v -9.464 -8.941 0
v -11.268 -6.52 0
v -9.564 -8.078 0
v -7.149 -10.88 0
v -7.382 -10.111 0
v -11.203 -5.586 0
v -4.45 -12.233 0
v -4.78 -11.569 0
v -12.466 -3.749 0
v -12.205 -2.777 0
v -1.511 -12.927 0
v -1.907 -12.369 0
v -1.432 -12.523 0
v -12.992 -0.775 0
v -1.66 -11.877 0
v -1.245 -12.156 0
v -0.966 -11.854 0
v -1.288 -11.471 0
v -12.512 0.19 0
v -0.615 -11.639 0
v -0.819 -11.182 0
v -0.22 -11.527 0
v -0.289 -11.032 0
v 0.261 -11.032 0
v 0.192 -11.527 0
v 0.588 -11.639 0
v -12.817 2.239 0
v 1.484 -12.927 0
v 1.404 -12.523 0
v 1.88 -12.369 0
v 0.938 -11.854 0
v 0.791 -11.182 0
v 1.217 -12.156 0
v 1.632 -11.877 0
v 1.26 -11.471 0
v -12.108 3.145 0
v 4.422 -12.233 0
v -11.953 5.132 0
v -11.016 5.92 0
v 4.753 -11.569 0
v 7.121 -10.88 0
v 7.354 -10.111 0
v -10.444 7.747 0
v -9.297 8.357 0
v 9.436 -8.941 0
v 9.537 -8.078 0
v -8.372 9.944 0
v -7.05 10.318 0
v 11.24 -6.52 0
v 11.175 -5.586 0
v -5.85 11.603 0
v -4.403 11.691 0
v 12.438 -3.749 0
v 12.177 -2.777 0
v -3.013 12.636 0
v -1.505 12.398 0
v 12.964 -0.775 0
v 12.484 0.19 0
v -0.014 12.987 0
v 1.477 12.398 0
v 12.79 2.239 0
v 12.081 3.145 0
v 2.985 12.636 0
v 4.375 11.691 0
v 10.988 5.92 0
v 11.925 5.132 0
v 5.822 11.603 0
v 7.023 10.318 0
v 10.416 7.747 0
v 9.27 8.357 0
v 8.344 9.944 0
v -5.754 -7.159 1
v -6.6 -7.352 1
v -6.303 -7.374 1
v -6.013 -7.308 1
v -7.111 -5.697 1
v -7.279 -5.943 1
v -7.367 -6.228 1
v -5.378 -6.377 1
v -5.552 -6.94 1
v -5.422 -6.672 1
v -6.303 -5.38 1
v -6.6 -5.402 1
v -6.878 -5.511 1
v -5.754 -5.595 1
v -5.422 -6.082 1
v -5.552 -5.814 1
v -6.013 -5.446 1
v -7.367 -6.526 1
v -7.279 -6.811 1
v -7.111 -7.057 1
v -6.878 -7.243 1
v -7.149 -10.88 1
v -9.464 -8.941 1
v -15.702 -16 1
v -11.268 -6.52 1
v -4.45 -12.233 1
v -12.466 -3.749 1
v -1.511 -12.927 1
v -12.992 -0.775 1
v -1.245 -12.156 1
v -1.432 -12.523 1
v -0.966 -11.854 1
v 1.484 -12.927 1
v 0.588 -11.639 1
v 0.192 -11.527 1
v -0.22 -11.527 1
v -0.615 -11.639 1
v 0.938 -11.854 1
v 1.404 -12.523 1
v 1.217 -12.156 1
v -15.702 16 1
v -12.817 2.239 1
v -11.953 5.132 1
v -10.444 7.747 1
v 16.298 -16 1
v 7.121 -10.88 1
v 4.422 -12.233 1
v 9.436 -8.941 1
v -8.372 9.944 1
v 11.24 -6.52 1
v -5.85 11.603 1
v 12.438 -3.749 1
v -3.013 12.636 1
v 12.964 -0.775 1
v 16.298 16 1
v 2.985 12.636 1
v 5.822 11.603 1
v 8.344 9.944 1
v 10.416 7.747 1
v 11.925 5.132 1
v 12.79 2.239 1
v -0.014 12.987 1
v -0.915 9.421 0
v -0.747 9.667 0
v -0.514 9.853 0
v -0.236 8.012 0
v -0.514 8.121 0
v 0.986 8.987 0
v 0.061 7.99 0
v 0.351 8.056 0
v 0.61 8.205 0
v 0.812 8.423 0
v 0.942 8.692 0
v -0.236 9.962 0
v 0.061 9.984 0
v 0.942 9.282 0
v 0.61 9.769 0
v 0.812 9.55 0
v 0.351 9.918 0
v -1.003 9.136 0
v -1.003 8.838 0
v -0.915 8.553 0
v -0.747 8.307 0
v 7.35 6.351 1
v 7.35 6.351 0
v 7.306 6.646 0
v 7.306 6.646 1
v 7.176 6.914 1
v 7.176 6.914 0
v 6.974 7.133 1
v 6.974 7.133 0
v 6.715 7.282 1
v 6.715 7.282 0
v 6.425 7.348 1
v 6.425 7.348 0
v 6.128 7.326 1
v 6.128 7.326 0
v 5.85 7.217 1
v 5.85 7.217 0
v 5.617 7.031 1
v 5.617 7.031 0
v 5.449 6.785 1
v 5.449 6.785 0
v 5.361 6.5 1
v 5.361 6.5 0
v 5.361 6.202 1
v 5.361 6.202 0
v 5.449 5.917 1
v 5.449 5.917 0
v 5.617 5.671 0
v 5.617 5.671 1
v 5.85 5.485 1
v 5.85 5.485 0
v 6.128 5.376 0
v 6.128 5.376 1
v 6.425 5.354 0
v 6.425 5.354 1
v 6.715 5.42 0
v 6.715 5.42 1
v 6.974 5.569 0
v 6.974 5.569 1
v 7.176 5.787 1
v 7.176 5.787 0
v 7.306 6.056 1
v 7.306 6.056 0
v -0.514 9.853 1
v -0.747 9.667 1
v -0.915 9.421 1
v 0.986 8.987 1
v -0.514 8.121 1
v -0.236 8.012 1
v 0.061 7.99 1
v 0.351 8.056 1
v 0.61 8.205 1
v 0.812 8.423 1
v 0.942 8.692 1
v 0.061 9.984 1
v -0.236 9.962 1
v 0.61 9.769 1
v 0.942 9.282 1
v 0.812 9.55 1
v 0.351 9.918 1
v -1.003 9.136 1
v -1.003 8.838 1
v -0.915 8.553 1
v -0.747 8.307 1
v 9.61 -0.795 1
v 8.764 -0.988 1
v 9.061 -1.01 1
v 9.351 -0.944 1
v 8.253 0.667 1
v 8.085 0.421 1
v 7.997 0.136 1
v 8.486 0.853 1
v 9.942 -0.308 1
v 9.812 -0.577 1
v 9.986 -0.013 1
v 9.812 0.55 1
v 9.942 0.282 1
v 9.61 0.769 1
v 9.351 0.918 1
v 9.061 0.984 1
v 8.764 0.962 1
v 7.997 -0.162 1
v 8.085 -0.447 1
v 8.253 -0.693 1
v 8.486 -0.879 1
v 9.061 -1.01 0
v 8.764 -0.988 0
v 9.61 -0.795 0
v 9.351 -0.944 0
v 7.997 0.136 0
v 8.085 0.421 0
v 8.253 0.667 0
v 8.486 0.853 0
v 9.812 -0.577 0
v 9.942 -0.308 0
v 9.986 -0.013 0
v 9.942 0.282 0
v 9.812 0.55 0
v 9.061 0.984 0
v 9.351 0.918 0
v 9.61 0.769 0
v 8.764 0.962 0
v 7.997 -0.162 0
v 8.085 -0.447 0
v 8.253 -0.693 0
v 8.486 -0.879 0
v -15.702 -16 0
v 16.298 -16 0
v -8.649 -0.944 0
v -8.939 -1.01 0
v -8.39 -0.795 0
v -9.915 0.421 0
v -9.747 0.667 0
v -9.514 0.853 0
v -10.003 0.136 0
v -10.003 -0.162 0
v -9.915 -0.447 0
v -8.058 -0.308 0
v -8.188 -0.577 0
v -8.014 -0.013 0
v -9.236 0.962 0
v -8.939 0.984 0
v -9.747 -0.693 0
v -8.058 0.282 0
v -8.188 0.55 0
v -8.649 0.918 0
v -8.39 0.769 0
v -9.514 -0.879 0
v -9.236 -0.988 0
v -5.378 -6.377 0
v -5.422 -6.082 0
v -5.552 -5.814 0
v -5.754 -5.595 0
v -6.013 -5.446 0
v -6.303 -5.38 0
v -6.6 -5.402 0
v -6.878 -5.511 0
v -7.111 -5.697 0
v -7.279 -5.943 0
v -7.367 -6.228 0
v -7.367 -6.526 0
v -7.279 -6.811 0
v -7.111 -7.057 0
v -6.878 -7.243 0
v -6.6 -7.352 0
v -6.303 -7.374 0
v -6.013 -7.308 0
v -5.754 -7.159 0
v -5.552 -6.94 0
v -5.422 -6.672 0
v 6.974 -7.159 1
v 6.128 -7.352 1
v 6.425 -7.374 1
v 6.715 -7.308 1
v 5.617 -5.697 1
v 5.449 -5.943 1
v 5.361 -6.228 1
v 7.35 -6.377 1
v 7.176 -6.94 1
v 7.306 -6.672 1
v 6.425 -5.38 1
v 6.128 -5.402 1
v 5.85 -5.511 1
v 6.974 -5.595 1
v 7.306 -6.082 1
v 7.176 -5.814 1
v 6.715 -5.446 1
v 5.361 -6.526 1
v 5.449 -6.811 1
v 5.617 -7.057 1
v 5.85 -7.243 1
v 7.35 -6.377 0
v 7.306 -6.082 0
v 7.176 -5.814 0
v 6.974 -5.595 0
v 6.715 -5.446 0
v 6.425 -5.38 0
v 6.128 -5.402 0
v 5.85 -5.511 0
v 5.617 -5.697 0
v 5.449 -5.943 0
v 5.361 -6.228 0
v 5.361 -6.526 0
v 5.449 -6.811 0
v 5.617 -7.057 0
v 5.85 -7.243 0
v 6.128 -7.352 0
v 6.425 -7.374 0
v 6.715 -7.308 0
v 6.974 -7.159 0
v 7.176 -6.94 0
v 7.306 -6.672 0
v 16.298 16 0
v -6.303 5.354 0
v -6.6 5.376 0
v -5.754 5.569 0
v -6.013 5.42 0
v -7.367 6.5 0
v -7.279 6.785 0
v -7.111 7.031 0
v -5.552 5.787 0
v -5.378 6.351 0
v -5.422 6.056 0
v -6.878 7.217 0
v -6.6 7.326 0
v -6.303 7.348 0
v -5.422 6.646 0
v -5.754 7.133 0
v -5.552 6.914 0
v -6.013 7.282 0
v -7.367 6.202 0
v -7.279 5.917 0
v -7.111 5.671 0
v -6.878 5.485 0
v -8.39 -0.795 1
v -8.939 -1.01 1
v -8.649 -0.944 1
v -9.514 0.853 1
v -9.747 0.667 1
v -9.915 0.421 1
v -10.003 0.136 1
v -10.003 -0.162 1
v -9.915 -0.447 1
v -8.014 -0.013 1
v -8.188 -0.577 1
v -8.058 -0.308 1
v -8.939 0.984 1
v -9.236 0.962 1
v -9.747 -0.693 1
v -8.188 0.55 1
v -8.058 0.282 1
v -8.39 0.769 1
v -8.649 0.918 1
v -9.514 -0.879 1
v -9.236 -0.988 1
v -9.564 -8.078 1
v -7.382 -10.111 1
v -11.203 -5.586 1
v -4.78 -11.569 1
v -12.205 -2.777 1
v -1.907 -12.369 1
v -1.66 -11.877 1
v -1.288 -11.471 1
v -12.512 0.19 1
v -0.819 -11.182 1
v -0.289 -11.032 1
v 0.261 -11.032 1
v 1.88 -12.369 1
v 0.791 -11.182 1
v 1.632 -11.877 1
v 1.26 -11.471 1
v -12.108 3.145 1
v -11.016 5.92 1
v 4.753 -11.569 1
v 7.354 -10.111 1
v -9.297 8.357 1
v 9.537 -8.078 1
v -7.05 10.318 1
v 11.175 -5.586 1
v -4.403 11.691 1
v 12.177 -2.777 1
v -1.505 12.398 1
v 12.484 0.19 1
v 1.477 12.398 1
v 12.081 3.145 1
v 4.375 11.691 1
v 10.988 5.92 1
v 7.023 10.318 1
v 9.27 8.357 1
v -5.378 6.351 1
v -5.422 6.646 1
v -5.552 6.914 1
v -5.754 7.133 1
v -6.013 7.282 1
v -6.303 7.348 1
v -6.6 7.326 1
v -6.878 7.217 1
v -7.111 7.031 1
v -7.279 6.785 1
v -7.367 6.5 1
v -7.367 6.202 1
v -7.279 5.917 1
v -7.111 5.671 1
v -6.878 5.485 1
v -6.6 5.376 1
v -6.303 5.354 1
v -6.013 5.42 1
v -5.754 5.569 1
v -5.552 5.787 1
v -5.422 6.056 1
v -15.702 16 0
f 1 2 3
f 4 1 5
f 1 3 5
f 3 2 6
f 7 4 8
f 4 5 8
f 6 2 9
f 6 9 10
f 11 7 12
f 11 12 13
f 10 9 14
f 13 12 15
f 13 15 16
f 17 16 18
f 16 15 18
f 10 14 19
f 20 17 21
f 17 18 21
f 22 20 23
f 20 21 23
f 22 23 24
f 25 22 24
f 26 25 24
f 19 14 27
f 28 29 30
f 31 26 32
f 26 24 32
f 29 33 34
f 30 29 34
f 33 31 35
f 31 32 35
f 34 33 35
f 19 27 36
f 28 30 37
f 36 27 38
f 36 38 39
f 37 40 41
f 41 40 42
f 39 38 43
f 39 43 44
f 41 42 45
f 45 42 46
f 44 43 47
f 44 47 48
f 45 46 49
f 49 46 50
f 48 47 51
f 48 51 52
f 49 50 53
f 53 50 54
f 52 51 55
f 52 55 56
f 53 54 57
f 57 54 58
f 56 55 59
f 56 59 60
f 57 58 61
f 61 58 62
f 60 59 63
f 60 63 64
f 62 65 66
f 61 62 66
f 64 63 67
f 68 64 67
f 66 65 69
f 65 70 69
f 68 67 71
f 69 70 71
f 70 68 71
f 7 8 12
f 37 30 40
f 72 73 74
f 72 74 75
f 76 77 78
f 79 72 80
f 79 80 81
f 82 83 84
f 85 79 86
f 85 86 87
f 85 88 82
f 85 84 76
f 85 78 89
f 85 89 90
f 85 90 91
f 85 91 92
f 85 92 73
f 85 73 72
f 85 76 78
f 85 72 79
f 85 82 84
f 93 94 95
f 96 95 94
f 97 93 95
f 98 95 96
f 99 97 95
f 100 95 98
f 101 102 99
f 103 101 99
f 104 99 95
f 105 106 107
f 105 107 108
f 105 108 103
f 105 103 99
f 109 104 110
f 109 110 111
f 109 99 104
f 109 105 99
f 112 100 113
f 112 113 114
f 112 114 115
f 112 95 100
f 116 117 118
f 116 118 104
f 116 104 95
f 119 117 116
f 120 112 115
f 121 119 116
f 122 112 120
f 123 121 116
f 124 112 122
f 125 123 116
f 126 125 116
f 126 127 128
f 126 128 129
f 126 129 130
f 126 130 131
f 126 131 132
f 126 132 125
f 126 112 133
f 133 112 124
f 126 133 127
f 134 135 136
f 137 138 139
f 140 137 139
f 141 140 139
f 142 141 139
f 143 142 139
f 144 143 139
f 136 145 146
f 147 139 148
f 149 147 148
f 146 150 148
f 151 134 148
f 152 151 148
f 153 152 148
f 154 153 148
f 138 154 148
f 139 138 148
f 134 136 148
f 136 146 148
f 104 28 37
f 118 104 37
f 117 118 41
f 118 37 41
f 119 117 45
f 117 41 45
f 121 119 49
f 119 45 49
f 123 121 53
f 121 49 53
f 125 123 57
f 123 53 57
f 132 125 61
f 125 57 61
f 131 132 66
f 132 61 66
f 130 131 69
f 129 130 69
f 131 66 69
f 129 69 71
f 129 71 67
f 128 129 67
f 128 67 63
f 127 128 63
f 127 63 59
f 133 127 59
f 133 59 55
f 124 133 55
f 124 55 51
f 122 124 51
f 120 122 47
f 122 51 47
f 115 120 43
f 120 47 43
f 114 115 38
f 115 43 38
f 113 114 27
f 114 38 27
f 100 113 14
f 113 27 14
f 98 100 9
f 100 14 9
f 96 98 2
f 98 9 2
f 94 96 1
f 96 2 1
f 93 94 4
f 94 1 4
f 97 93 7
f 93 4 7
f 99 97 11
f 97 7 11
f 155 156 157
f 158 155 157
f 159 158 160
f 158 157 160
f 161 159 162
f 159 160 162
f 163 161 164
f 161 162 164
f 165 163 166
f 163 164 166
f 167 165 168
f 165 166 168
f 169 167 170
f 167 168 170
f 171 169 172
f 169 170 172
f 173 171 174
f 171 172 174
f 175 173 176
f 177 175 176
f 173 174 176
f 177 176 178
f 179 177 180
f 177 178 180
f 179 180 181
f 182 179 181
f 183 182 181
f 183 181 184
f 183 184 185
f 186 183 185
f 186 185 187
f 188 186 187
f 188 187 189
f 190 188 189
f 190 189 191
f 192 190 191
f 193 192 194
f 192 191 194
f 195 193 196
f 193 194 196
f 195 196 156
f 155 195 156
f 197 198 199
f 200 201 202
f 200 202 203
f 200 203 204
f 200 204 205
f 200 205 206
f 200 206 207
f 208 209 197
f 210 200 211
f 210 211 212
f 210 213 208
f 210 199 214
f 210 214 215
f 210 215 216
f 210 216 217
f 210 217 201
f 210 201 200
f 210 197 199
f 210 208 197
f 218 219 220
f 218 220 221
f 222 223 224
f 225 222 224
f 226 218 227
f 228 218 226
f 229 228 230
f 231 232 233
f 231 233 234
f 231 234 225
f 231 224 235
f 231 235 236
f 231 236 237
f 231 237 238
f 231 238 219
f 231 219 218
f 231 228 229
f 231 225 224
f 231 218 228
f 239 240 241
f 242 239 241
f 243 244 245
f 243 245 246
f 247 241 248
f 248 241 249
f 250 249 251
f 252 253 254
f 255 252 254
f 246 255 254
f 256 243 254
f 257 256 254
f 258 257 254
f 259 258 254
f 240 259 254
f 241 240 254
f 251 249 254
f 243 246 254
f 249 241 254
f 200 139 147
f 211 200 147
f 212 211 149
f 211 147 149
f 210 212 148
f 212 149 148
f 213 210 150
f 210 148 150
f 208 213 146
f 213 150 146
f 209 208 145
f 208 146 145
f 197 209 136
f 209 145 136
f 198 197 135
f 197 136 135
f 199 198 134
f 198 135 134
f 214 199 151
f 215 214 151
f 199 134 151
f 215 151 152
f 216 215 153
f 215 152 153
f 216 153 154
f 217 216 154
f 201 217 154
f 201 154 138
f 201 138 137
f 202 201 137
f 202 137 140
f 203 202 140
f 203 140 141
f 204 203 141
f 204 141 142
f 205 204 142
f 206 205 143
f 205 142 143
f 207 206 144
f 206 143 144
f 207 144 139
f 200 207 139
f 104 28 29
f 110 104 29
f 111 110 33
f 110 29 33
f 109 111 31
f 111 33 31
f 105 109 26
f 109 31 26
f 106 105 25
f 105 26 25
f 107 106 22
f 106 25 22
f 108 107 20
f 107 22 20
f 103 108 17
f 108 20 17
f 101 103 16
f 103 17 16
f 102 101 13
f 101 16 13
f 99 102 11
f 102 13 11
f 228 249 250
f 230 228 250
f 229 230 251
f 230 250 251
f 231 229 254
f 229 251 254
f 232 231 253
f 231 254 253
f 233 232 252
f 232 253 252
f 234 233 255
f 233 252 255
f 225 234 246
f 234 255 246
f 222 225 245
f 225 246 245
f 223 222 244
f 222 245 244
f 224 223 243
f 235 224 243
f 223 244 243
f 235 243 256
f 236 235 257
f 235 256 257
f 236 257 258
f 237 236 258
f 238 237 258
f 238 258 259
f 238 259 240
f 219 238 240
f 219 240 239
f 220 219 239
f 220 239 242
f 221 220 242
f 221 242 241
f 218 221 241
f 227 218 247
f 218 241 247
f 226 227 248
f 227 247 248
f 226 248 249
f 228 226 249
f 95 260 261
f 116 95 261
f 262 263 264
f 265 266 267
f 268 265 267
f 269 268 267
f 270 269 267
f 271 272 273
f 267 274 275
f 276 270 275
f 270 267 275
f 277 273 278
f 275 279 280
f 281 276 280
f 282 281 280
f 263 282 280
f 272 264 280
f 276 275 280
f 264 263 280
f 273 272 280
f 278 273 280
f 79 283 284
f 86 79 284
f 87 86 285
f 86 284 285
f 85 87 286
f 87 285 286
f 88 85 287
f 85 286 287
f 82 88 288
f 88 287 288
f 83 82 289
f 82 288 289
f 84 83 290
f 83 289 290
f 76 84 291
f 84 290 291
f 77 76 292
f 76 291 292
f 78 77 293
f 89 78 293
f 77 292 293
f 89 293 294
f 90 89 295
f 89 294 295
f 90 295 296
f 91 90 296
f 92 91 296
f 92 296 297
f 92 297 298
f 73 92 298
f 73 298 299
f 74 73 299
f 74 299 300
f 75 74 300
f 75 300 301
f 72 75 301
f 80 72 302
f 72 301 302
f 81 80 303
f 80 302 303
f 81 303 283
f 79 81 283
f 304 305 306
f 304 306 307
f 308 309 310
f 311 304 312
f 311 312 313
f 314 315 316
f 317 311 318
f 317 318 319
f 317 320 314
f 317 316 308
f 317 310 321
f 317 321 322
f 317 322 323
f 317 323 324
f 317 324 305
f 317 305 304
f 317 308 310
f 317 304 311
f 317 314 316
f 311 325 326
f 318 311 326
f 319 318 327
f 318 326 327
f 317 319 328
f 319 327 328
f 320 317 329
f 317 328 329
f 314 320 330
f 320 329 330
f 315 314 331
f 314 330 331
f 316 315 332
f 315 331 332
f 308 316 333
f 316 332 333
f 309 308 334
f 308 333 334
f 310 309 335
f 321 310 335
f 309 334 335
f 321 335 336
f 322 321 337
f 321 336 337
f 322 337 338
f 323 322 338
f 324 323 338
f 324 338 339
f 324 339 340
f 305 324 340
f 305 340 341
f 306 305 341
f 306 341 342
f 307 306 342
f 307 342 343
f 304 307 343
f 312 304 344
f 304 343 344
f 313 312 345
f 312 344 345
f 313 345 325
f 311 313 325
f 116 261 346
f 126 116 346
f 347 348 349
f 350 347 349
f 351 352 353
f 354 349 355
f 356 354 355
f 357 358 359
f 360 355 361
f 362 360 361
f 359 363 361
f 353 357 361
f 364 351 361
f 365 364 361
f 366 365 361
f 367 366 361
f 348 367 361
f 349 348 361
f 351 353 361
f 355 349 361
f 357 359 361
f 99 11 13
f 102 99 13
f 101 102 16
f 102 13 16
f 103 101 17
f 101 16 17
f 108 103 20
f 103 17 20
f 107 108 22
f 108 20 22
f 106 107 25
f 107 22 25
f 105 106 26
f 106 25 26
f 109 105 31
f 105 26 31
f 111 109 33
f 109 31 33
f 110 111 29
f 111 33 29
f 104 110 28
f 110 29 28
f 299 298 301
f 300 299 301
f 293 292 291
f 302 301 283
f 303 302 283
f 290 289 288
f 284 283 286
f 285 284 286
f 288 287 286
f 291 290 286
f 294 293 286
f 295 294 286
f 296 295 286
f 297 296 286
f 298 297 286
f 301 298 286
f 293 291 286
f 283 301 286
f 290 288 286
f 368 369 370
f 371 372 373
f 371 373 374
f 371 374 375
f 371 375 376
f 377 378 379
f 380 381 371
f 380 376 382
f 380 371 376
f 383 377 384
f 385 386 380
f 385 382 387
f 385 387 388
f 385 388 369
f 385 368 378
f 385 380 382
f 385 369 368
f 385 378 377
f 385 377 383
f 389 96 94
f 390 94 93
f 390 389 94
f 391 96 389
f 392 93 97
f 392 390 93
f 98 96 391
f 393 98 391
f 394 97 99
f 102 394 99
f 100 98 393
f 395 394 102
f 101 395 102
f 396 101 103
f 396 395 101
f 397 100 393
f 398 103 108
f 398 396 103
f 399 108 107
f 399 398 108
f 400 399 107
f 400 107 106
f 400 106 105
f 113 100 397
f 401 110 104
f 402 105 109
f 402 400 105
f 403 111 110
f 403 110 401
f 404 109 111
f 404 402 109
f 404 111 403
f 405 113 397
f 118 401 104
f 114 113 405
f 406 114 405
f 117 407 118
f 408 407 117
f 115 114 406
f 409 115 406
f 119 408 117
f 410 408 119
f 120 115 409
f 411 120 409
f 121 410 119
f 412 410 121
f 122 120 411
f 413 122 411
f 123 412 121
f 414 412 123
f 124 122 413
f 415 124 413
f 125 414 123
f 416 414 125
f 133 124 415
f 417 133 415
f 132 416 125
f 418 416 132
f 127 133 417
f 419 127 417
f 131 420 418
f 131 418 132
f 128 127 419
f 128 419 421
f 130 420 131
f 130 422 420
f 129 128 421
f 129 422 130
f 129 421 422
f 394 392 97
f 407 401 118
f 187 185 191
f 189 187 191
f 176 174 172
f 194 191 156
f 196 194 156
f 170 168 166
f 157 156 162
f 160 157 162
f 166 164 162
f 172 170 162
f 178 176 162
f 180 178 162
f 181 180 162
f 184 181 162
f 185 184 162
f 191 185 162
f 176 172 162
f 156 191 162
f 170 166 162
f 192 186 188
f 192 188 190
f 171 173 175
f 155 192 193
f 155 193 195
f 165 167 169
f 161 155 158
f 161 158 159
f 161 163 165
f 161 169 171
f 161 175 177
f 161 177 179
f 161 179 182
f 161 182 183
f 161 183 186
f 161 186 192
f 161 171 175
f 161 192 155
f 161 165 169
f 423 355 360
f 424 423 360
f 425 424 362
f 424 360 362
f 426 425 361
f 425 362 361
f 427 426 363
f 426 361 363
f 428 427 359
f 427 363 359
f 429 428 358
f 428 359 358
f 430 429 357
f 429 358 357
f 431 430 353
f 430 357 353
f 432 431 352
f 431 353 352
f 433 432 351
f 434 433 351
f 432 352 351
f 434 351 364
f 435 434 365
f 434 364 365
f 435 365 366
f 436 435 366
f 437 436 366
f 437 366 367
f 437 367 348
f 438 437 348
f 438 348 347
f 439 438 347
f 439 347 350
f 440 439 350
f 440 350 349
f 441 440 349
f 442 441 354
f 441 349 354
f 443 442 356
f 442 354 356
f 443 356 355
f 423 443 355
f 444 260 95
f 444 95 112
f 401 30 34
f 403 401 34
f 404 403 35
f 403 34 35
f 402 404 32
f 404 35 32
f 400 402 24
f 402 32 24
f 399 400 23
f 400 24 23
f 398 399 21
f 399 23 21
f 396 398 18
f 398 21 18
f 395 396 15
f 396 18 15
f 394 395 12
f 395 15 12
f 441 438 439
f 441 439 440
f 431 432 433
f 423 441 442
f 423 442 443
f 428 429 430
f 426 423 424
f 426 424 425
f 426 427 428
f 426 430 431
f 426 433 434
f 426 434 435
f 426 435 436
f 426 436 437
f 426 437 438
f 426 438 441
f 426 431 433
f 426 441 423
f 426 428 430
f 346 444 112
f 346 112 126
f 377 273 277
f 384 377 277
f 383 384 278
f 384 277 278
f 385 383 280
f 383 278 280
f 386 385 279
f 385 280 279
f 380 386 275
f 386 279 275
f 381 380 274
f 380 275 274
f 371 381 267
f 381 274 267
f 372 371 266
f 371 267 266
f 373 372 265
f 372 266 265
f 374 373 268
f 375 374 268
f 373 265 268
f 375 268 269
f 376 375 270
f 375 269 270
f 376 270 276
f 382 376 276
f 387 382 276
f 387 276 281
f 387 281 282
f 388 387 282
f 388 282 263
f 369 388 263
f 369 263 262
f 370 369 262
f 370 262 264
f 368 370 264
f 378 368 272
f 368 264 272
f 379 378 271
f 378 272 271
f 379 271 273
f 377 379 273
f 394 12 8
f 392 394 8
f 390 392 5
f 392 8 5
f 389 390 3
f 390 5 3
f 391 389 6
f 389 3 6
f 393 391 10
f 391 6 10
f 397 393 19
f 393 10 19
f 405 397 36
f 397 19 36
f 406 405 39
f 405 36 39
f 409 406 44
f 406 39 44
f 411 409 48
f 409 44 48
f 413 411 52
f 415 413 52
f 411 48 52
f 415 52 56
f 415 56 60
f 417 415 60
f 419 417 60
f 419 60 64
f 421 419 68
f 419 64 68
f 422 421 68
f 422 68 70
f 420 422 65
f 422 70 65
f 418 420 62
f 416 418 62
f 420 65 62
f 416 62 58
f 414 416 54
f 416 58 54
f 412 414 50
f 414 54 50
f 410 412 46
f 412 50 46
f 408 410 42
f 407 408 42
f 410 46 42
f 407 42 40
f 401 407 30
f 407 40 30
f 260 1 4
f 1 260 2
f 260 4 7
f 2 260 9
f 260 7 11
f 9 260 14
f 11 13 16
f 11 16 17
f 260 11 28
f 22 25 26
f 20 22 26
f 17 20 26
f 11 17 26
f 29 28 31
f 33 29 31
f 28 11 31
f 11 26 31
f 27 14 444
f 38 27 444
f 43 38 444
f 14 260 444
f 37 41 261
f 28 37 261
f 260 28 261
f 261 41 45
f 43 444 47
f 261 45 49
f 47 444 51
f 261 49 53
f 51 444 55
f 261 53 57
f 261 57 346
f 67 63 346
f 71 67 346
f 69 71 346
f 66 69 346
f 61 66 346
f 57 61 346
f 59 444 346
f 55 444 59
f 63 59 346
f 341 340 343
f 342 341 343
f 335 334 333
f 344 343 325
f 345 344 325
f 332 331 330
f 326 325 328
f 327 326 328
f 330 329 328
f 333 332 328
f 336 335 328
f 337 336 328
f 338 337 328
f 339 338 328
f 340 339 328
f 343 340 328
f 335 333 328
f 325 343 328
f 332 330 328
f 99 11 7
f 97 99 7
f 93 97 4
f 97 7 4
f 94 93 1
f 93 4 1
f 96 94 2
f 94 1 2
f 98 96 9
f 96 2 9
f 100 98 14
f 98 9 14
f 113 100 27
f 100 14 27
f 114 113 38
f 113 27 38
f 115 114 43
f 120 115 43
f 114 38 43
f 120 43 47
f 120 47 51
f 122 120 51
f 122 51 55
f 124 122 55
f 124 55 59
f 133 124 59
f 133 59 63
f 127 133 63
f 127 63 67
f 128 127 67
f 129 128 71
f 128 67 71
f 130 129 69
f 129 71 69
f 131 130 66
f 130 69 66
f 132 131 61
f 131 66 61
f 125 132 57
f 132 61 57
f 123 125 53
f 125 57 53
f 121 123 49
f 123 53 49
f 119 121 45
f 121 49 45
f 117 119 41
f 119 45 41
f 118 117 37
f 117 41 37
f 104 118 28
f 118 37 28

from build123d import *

# Parameters (mm, degrees)
F0_R     = 1
F1_DEPTH = 1
F0_W     = 32
F0_H     = 32
F2_DEPTH = 1


with BuildPart() as f1:
    # F0 (on Top) → F1 (new body)
    with BuildSketch(Plane.XY):
        with Locations((-9.0139002259, -0.0131933517)):
            Circle(F0_R)
    extrude(amount=F1_DEPTH)


with BuildPart() as f1b:
    # F0 (on Top) → F1, piece 2 (new body)
    with BuildSketch(Plane.XY):
        with Locations((-6.3778612566, 6.350767679)):
            Circle(F0_R)
    extrude(amount=F1_DEPTH)


with BuildPart() as f1c:
    # F0 (on Top) → F1, piece 3 (new body)
    with BuildSketch(Plane.XY):
        with Locations((-0.0139002259, 8.9868066483)):
            Circle(F0_R)
    extrude(amount=F1_DEPTH)


with BuildPart() as f1d:
    # F0 (on Top) → F1, piece 4 (new body)
    with BuildSketch(Plane.XY):
        with Locations((6.3500608048, 6.350767679)):
            Circle(F0_R)
    extrude(amount=F1_DEPTH)


with BuildPart() as f1e:
    # F0 (on Top) → F1, piece 5 (new body)
    with BuildSketch(Plane.XY):
        with Locations((8.9860997741, -0.0131933517)):
            Circle(F0_R)
    extrude(amount=F1_DEPTH)


with BuildPart() as f1f:
    # F0 (on Top) → F1, piece 6 (new body)
    with BuildSketch(Plane.XY):
        with Locations((6.3500608048, -6.3771543823)):
            Circle(F0_R)
    extrude(amount=F1_DEPTH)


with BuildPart() as f1g:
    # F0 (on Top) → F1, piece 7 (new body)
    with BuildSketch(Plane.XY):
        with Locations((-6.3778612566, -6.3771543823)):
            Circle(F0_R)
    extrude(amount=F1_DEPTH)


with BuildPart() as f1h:
    # F0 (on Top) → F1, piece 8 (new body)
    with BuildSketch(Plane.XY):
        with BuildLine():
            ThreePointArc((-1.5114018435, -12.9266548901), (-0.0139002259, -11.5131933517), (1.4836013917, -12.9266548901))
            ThreePointArc((1.4836013917, -12.9266548901), (-0.0139002259, 12.9868066483), (-1.5114018435, -12.9266548901))
        make_face()
        with BuildLine():
            ThreePointArc((-1.9073010593, -12.3689625824), (-0.0139002259, 12.4868066483), (1.8795006075, -12.3689625824))
            ThreePointArc((1.8795006075, -12.3689625824), (-0.0139002259, -11.0131933517), (-1.9073010593, -12.3689625824))
        make_face(mode=Mode.SUBTRACT)
    extrude(amount=F1_DEPTH)


with BuildPart() as f2:
    # F0 (on Top) → F2 (new body)
    with BuildSketch(Plane.XY):
        with Locations((0.2982817241, 0)):
            Rectangle(F0_W, F0_H)
        with BuildLine():
            ThreePointArc((-1.5114018435, -12.9266548901), (-0.0139002259, 12.9868066483), (1.4836013917, -12.9266548901))
            ThreePointArc((1.4836013917, -12.9266548901), (-0.0139002259, -11.5131933517), (-1.5114018435, -12.9266548901))
        make_face(mode=Mode.SUBTRACT)
    extrude(amount=F2_DEPTH)


solid = Compound([f1.part, f1b.part, f1c.part, f1d.part, f1e.part, f1f.part, f1g.part, f1h.part, f2.part])
